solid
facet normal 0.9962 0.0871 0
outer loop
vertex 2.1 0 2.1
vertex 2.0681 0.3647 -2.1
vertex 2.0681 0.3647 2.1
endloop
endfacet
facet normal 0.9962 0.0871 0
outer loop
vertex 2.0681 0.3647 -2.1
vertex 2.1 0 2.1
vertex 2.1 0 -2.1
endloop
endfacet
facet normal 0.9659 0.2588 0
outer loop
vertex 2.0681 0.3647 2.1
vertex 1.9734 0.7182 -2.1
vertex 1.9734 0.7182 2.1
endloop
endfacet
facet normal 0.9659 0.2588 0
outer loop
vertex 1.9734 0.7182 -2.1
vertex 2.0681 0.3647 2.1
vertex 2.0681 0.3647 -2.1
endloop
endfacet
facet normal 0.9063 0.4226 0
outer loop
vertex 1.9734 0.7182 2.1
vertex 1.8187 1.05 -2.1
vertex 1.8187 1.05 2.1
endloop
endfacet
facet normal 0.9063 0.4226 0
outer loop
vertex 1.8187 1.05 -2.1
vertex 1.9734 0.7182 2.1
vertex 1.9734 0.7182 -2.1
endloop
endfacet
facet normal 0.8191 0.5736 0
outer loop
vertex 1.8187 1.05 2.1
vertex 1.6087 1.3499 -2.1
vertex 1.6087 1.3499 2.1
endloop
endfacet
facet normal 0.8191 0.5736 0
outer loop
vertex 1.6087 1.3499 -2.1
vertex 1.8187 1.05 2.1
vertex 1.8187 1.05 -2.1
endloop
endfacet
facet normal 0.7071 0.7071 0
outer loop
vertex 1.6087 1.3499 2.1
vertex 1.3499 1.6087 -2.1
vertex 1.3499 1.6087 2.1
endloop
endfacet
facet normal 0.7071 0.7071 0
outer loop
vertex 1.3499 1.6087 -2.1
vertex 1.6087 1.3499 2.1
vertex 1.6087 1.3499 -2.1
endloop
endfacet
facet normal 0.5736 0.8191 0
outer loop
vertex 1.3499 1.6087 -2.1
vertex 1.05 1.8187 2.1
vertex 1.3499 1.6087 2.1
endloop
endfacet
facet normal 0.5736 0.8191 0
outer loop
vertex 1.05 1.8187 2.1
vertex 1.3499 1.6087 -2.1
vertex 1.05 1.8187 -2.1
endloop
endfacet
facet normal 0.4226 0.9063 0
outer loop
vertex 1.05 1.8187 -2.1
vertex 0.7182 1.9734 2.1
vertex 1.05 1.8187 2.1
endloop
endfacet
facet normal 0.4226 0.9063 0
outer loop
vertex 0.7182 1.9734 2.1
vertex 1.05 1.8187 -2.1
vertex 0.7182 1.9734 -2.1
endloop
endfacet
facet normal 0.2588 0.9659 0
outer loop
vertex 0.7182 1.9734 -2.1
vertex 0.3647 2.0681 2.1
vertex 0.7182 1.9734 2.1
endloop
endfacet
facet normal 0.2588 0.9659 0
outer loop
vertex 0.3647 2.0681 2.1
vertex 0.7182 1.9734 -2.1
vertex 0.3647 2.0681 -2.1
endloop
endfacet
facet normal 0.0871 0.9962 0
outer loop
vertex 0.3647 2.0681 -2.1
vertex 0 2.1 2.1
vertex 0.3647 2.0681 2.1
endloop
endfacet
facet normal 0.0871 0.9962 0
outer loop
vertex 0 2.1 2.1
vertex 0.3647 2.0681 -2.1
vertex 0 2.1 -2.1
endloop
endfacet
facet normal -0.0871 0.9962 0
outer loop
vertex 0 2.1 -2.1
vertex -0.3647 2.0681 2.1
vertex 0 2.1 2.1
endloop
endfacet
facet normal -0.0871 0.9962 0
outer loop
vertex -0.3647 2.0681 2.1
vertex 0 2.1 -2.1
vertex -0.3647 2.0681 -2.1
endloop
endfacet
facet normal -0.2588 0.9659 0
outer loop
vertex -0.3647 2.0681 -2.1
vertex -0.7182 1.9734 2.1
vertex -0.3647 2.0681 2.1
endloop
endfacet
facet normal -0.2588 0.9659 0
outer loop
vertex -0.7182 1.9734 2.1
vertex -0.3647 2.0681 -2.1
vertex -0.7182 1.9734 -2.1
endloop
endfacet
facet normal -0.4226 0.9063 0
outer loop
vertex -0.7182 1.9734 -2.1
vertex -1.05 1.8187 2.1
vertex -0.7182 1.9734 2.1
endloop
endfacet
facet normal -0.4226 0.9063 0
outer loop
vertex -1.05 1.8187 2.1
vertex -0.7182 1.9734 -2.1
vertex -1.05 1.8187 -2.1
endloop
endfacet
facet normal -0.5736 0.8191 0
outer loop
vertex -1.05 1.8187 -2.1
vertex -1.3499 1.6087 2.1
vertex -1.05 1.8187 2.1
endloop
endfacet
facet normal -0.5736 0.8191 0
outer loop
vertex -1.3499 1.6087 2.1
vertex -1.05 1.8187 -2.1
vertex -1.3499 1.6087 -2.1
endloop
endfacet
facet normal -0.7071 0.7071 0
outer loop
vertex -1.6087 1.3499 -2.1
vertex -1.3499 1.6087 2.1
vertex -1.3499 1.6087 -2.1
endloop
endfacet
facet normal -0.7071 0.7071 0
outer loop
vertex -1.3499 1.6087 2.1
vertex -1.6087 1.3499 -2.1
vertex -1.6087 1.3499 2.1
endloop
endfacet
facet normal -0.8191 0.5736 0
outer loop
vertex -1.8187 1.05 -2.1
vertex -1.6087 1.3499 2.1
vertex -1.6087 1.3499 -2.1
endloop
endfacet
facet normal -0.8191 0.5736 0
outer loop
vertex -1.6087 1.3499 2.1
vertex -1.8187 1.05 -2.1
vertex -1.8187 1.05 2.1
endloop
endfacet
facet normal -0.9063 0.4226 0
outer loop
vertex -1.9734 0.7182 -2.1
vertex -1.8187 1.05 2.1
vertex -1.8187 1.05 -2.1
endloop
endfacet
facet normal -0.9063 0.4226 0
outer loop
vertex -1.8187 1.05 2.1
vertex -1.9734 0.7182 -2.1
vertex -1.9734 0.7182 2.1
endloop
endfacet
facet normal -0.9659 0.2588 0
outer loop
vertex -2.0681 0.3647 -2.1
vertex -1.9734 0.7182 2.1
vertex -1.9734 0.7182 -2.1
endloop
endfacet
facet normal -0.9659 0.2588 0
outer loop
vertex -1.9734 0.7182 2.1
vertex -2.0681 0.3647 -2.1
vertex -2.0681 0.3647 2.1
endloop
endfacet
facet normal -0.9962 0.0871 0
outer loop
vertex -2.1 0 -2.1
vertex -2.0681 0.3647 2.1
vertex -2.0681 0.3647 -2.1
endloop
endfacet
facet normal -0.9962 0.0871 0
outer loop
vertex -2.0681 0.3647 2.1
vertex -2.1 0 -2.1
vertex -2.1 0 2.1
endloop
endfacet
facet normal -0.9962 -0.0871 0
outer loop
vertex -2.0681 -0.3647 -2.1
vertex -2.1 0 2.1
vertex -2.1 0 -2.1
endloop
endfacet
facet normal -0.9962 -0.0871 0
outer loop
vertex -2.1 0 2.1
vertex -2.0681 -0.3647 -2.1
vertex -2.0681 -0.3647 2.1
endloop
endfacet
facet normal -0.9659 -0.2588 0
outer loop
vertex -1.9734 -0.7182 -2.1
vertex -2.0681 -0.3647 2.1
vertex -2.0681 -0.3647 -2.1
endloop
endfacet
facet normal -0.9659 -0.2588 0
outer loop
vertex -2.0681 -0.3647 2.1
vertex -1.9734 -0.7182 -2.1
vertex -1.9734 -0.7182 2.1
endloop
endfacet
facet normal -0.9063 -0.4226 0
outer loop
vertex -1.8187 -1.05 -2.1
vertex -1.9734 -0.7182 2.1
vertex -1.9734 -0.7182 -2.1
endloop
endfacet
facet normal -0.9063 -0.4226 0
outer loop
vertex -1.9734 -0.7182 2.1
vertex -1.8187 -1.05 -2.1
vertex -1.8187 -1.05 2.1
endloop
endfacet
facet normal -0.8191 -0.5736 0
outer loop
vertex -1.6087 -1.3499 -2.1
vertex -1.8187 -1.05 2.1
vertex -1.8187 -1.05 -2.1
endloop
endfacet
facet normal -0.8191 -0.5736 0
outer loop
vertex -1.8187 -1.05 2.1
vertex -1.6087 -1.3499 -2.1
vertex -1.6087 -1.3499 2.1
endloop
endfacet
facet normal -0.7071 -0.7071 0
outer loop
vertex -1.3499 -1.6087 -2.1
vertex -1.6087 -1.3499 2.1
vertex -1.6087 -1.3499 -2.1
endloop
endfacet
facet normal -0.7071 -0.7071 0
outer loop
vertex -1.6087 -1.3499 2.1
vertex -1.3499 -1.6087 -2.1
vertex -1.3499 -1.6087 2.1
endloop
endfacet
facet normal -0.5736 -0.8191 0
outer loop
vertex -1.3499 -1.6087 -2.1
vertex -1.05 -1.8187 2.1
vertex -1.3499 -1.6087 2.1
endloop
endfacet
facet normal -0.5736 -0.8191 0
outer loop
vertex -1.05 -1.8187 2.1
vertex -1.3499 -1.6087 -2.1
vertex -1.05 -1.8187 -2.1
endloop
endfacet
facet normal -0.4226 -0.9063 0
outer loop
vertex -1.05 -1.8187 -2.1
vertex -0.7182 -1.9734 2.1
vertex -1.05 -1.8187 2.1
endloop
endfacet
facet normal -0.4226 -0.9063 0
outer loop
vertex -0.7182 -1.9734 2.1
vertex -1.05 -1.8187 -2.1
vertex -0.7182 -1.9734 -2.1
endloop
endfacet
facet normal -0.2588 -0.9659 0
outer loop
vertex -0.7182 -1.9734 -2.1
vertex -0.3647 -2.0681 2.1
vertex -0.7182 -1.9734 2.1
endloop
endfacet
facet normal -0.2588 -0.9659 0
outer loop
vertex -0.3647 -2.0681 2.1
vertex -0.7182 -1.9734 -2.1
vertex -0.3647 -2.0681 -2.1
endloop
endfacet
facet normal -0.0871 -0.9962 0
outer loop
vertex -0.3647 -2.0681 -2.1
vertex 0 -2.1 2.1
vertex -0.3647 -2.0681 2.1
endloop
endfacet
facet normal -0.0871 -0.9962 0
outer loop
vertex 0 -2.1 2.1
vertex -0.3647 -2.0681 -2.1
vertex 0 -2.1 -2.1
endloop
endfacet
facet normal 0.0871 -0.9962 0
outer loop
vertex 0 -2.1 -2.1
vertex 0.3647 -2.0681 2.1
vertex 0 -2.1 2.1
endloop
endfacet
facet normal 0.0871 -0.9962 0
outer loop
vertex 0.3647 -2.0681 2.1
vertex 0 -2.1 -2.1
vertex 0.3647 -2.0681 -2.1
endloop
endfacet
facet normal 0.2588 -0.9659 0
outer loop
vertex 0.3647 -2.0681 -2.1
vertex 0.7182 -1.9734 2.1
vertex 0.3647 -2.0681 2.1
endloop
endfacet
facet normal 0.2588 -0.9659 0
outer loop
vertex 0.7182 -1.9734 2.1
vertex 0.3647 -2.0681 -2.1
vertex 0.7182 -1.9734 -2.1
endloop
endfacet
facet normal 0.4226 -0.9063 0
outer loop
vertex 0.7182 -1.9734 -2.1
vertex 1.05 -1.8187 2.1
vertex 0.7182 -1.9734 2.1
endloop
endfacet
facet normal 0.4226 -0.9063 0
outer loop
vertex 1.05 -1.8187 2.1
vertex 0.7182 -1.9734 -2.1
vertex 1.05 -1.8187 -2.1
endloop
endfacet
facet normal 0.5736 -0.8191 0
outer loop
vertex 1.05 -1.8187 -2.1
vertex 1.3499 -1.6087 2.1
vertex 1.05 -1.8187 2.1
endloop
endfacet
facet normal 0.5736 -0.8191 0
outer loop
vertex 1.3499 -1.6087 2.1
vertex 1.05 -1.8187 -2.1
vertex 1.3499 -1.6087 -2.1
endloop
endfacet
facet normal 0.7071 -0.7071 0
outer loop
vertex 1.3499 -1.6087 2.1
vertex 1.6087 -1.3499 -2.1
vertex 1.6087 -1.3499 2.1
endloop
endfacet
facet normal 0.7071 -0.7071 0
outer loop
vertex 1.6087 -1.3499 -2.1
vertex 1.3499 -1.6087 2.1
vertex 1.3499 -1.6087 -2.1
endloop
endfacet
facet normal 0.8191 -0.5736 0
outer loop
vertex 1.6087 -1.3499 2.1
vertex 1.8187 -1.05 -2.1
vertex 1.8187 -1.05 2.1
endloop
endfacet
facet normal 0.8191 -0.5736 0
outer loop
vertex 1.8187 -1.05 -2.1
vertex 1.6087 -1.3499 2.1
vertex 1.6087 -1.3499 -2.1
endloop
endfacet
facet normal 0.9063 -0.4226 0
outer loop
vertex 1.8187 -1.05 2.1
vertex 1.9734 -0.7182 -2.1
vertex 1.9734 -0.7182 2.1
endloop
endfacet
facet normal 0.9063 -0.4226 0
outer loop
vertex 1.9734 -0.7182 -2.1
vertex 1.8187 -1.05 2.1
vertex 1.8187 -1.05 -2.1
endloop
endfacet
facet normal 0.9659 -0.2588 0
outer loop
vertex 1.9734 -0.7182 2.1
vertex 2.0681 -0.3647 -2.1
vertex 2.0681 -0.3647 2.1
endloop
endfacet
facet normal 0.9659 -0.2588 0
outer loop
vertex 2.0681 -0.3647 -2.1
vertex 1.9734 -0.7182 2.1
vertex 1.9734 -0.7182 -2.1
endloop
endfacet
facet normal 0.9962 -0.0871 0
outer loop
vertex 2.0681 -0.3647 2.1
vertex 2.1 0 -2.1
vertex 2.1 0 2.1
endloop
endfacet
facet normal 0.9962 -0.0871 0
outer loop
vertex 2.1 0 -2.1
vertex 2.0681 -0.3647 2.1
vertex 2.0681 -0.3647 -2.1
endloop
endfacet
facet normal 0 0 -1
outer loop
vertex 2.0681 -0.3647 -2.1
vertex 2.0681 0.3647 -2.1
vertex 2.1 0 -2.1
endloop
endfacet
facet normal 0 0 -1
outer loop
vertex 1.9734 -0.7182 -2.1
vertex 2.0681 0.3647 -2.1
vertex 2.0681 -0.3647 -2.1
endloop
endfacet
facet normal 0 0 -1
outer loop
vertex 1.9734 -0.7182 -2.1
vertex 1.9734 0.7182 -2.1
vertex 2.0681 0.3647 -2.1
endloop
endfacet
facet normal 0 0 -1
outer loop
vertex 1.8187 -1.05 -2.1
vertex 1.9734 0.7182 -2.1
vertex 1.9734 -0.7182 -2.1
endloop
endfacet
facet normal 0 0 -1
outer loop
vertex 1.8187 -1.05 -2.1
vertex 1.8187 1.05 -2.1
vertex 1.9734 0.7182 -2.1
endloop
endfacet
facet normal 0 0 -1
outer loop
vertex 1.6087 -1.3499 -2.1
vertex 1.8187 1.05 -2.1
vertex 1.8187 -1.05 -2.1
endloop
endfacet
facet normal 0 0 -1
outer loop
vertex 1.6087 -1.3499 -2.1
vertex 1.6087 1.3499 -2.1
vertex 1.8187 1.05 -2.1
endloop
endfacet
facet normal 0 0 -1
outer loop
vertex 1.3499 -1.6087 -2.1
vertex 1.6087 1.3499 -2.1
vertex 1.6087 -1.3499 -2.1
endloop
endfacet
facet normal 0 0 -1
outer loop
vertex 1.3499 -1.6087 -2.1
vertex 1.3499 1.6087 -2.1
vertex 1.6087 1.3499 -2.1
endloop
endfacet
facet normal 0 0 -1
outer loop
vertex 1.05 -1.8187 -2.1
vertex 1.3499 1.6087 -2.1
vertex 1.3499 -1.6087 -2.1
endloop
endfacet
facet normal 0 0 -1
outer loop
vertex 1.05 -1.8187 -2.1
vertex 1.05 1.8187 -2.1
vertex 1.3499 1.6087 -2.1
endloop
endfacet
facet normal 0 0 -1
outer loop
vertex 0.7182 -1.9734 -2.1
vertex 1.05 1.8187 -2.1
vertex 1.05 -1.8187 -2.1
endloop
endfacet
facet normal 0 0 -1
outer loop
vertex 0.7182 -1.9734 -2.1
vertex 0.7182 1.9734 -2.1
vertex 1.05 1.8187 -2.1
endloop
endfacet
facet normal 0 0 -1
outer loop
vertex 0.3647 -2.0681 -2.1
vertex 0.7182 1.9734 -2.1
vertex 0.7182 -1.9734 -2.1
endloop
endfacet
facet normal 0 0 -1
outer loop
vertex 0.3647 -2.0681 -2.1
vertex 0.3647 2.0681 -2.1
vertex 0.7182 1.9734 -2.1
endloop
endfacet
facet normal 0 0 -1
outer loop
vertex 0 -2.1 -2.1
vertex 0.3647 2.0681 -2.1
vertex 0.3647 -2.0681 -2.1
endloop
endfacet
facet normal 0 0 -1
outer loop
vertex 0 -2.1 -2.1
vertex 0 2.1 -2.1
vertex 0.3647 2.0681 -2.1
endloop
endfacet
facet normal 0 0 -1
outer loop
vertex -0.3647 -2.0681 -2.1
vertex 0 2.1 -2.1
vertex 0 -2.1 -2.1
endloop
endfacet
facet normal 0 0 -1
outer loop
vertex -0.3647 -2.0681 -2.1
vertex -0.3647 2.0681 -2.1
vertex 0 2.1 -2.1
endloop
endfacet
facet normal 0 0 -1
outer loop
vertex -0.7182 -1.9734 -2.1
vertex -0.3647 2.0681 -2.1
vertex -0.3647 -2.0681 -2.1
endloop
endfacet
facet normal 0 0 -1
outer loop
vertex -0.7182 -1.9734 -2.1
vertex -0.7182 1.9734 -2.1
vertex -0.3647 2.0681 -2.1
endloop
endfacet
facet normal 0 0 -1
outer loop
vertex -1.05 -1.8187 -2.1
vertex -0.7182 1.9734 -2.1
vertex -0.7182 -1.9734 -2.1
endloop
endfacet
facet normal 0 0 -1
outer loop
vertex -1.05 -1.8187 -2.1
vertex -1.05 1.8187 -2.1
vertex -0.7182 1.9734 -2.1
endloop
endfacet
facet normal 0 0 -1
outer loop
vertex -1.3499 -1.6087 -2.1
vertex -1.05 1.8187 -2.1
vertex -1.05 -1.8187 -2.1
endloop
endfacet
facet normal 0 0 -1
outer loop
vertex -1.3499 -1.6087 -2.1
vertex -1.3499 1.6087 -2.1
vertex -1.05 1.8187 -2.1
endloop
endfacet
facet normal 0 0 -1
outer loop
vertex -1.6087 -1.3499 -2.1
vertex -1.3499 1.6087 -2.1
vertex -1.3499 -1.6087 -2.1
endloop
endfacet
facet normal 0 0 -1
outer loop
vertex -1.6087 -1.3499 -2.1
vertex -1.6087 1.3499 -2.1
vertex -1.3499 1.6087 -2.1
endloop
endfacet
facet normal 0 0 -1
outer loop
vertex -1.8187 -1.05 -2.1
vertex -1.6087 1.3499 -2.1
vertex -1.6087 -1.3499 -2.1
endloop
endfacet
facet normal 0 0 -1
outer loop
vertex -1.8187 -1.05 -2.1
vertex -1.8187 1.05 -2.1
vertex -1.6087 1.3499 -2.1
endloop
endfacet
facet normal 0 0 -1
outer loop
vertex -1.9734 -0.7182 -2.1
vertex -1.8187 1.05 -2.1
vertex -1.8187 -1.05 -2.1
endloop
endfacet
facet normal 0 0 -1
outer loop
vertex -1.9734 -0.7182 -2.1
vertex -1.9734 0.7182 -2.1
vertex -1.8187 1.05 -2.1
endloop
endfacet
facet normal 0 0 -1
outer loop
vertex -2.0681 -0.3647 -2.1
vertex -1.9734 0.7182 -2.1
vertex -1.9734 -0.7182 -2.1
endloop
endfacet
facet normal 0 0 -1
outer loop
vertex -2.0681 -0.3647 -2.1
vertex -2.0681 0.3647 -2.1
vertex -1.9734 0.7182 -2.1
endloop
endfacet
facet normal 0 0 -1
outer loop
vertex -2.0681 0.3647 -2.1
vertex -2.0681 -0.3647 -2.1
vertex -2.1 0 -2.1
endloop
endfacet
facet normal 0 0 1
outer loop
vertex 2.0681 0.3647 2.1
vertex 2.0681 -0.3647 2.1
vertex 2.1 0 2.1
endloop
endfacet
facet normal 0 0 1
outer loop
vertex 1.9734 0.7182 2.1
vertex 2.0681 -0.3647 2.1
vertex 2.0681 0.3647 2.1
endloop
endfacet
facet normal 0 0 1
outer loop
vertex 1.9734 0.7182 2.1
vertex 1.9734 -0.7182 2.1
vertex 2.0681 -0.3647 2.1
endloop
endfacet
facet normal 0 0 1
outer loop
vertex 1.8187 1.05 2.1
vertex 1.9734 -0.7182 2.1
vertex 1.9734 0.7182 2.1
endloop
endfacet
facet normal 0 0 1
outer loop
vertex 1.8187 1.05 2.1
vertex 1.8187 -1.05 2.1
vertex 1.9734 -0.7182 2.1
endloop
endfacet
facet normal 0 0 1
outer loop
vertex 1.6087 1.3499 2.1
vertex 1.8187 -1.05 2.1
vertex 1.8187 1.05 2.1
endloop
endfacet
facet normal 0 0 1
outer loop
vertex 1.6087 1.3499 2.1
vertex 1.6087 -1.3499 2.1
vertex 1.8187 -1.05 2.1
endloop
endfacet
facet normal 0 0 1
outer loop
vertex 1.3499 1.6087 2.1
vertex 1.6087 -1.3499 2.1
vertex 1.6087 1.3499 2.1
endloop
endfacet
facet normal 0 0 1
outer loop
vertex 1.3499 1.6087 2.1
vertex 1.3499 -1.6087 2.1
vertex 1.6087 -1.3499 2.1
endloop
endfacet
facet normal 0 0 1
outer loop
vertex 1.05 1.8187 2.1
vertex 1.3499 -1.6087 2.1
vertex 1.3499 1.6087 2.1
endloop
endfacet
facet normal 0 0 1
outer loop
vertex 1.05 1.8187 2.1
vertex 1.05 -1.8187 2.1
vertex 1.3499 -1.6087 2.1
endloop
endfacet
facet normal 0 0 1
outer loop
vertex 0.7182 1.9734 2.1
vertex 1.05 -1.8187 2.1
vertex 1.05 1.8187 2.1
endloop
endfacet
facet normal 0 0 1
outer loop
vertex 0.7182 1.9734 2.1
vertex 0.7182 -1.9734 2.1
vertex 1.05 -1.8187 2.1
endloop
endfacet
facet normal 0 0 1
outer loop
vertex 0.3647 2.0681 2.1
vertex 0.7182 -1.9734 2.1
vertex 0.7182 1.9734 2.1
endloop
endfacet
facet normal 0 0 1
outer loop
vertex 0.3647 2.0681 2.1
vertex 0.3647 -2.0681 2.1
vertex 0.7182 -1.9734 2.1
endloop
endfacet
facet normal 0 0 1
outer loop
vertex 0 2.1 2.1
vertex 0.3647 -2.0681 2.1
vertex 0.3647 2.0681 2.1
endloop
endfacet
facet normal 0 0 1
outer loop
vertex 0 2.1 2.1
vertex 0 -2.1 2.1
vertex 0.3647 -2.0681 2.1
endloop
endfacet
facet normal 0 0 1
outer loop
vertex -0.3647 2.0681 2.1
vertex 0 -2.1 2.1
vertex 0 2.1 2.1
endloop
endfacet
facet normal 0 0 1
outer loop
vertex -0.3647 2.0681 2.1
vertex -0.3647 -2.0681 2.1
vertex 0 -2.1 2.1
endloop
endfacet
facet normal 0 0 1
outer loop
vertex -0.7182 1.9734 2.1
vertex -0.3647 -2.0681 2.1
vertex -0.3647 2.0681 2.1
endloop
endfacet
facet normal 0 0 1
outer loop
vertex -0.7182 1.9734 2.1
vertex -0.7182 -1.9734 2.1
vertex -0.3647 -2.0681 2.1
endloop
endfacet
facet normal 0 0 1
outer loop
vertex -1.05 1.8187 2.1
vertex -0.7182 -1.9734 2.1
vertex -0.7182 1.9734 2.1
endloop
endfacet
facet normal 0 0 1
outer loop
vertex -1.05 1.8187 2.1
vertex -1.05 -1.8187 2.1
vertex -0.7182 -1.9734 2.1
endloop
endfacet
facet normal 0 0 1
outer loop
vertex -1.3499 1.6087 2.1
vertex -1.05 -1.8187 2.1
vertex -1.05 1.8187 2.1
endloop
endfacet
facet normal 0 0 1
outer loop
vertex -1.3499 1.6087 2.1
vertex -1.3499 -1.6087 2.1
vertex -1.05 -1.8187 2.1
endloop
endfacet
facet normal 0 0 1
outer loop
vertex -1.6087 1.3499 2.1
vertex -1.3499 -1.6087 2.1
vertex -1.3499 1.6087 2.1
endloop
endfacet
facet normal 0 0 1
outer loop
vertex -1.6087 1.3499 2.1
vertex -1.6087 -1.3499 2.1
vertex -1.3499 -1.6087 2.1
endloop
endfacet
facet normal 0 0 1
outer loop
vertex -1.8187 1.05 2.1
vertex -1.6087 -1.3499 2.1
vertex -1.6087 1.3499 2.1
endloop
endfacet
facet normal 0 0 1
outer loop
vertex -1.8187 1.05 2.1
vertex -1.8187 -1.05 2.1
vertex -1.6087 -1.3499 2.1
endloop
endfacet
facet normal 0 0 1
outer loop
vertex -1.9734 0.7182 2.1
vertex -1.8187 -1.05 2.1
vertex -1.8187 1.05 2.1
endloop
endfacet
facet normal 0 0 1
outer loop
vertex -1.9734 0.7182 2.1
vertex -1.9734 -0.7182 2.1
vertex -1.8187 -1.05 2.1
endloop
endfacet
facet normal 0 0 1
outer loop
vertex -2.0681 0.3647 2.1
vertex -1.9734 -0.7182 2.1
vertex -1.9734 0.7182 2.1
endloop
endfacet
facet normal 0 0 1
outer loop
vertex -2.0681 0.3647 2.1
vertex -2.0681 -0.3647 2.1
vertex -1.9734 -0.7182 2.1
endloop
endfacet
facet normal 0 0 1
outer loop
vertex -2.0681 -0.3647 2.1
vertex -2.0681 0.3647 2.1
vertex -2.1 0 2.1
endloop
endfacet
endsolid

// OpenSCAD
//
// magnet_bullet.scad
//

// a simple hex, with magnet ball cylinders...


// unit is mm

inch = 25.4;
o2 = 0.2;
br = 1.7; // ball diameter

hr = 32.33;
hr1 = 28;
//hh = br * 2 + o2 + 3 * o2;
hh = 5;
//echo("hh", hh);


module bullet() {

  module balcyl() {
    cylinder(r=br + 2 * o2, h=hh - 4 * o2, center=true, $fn=36);
  }

  balcyl();
  //difference() {
  //  cylinder(r=hr, h=hh, center=true, $fn=6);
  //  union() {
  //    balcyl();
  //    for (a = [ 30 : 60 : 330 ]) {
  //      rotate([ 0, 0, a ])
  //        translate([ hr1 - br - 4 * o2, 0, 0 ])
  //          balcyl();
  //    }
  //  }
  //}
}

bullet();
